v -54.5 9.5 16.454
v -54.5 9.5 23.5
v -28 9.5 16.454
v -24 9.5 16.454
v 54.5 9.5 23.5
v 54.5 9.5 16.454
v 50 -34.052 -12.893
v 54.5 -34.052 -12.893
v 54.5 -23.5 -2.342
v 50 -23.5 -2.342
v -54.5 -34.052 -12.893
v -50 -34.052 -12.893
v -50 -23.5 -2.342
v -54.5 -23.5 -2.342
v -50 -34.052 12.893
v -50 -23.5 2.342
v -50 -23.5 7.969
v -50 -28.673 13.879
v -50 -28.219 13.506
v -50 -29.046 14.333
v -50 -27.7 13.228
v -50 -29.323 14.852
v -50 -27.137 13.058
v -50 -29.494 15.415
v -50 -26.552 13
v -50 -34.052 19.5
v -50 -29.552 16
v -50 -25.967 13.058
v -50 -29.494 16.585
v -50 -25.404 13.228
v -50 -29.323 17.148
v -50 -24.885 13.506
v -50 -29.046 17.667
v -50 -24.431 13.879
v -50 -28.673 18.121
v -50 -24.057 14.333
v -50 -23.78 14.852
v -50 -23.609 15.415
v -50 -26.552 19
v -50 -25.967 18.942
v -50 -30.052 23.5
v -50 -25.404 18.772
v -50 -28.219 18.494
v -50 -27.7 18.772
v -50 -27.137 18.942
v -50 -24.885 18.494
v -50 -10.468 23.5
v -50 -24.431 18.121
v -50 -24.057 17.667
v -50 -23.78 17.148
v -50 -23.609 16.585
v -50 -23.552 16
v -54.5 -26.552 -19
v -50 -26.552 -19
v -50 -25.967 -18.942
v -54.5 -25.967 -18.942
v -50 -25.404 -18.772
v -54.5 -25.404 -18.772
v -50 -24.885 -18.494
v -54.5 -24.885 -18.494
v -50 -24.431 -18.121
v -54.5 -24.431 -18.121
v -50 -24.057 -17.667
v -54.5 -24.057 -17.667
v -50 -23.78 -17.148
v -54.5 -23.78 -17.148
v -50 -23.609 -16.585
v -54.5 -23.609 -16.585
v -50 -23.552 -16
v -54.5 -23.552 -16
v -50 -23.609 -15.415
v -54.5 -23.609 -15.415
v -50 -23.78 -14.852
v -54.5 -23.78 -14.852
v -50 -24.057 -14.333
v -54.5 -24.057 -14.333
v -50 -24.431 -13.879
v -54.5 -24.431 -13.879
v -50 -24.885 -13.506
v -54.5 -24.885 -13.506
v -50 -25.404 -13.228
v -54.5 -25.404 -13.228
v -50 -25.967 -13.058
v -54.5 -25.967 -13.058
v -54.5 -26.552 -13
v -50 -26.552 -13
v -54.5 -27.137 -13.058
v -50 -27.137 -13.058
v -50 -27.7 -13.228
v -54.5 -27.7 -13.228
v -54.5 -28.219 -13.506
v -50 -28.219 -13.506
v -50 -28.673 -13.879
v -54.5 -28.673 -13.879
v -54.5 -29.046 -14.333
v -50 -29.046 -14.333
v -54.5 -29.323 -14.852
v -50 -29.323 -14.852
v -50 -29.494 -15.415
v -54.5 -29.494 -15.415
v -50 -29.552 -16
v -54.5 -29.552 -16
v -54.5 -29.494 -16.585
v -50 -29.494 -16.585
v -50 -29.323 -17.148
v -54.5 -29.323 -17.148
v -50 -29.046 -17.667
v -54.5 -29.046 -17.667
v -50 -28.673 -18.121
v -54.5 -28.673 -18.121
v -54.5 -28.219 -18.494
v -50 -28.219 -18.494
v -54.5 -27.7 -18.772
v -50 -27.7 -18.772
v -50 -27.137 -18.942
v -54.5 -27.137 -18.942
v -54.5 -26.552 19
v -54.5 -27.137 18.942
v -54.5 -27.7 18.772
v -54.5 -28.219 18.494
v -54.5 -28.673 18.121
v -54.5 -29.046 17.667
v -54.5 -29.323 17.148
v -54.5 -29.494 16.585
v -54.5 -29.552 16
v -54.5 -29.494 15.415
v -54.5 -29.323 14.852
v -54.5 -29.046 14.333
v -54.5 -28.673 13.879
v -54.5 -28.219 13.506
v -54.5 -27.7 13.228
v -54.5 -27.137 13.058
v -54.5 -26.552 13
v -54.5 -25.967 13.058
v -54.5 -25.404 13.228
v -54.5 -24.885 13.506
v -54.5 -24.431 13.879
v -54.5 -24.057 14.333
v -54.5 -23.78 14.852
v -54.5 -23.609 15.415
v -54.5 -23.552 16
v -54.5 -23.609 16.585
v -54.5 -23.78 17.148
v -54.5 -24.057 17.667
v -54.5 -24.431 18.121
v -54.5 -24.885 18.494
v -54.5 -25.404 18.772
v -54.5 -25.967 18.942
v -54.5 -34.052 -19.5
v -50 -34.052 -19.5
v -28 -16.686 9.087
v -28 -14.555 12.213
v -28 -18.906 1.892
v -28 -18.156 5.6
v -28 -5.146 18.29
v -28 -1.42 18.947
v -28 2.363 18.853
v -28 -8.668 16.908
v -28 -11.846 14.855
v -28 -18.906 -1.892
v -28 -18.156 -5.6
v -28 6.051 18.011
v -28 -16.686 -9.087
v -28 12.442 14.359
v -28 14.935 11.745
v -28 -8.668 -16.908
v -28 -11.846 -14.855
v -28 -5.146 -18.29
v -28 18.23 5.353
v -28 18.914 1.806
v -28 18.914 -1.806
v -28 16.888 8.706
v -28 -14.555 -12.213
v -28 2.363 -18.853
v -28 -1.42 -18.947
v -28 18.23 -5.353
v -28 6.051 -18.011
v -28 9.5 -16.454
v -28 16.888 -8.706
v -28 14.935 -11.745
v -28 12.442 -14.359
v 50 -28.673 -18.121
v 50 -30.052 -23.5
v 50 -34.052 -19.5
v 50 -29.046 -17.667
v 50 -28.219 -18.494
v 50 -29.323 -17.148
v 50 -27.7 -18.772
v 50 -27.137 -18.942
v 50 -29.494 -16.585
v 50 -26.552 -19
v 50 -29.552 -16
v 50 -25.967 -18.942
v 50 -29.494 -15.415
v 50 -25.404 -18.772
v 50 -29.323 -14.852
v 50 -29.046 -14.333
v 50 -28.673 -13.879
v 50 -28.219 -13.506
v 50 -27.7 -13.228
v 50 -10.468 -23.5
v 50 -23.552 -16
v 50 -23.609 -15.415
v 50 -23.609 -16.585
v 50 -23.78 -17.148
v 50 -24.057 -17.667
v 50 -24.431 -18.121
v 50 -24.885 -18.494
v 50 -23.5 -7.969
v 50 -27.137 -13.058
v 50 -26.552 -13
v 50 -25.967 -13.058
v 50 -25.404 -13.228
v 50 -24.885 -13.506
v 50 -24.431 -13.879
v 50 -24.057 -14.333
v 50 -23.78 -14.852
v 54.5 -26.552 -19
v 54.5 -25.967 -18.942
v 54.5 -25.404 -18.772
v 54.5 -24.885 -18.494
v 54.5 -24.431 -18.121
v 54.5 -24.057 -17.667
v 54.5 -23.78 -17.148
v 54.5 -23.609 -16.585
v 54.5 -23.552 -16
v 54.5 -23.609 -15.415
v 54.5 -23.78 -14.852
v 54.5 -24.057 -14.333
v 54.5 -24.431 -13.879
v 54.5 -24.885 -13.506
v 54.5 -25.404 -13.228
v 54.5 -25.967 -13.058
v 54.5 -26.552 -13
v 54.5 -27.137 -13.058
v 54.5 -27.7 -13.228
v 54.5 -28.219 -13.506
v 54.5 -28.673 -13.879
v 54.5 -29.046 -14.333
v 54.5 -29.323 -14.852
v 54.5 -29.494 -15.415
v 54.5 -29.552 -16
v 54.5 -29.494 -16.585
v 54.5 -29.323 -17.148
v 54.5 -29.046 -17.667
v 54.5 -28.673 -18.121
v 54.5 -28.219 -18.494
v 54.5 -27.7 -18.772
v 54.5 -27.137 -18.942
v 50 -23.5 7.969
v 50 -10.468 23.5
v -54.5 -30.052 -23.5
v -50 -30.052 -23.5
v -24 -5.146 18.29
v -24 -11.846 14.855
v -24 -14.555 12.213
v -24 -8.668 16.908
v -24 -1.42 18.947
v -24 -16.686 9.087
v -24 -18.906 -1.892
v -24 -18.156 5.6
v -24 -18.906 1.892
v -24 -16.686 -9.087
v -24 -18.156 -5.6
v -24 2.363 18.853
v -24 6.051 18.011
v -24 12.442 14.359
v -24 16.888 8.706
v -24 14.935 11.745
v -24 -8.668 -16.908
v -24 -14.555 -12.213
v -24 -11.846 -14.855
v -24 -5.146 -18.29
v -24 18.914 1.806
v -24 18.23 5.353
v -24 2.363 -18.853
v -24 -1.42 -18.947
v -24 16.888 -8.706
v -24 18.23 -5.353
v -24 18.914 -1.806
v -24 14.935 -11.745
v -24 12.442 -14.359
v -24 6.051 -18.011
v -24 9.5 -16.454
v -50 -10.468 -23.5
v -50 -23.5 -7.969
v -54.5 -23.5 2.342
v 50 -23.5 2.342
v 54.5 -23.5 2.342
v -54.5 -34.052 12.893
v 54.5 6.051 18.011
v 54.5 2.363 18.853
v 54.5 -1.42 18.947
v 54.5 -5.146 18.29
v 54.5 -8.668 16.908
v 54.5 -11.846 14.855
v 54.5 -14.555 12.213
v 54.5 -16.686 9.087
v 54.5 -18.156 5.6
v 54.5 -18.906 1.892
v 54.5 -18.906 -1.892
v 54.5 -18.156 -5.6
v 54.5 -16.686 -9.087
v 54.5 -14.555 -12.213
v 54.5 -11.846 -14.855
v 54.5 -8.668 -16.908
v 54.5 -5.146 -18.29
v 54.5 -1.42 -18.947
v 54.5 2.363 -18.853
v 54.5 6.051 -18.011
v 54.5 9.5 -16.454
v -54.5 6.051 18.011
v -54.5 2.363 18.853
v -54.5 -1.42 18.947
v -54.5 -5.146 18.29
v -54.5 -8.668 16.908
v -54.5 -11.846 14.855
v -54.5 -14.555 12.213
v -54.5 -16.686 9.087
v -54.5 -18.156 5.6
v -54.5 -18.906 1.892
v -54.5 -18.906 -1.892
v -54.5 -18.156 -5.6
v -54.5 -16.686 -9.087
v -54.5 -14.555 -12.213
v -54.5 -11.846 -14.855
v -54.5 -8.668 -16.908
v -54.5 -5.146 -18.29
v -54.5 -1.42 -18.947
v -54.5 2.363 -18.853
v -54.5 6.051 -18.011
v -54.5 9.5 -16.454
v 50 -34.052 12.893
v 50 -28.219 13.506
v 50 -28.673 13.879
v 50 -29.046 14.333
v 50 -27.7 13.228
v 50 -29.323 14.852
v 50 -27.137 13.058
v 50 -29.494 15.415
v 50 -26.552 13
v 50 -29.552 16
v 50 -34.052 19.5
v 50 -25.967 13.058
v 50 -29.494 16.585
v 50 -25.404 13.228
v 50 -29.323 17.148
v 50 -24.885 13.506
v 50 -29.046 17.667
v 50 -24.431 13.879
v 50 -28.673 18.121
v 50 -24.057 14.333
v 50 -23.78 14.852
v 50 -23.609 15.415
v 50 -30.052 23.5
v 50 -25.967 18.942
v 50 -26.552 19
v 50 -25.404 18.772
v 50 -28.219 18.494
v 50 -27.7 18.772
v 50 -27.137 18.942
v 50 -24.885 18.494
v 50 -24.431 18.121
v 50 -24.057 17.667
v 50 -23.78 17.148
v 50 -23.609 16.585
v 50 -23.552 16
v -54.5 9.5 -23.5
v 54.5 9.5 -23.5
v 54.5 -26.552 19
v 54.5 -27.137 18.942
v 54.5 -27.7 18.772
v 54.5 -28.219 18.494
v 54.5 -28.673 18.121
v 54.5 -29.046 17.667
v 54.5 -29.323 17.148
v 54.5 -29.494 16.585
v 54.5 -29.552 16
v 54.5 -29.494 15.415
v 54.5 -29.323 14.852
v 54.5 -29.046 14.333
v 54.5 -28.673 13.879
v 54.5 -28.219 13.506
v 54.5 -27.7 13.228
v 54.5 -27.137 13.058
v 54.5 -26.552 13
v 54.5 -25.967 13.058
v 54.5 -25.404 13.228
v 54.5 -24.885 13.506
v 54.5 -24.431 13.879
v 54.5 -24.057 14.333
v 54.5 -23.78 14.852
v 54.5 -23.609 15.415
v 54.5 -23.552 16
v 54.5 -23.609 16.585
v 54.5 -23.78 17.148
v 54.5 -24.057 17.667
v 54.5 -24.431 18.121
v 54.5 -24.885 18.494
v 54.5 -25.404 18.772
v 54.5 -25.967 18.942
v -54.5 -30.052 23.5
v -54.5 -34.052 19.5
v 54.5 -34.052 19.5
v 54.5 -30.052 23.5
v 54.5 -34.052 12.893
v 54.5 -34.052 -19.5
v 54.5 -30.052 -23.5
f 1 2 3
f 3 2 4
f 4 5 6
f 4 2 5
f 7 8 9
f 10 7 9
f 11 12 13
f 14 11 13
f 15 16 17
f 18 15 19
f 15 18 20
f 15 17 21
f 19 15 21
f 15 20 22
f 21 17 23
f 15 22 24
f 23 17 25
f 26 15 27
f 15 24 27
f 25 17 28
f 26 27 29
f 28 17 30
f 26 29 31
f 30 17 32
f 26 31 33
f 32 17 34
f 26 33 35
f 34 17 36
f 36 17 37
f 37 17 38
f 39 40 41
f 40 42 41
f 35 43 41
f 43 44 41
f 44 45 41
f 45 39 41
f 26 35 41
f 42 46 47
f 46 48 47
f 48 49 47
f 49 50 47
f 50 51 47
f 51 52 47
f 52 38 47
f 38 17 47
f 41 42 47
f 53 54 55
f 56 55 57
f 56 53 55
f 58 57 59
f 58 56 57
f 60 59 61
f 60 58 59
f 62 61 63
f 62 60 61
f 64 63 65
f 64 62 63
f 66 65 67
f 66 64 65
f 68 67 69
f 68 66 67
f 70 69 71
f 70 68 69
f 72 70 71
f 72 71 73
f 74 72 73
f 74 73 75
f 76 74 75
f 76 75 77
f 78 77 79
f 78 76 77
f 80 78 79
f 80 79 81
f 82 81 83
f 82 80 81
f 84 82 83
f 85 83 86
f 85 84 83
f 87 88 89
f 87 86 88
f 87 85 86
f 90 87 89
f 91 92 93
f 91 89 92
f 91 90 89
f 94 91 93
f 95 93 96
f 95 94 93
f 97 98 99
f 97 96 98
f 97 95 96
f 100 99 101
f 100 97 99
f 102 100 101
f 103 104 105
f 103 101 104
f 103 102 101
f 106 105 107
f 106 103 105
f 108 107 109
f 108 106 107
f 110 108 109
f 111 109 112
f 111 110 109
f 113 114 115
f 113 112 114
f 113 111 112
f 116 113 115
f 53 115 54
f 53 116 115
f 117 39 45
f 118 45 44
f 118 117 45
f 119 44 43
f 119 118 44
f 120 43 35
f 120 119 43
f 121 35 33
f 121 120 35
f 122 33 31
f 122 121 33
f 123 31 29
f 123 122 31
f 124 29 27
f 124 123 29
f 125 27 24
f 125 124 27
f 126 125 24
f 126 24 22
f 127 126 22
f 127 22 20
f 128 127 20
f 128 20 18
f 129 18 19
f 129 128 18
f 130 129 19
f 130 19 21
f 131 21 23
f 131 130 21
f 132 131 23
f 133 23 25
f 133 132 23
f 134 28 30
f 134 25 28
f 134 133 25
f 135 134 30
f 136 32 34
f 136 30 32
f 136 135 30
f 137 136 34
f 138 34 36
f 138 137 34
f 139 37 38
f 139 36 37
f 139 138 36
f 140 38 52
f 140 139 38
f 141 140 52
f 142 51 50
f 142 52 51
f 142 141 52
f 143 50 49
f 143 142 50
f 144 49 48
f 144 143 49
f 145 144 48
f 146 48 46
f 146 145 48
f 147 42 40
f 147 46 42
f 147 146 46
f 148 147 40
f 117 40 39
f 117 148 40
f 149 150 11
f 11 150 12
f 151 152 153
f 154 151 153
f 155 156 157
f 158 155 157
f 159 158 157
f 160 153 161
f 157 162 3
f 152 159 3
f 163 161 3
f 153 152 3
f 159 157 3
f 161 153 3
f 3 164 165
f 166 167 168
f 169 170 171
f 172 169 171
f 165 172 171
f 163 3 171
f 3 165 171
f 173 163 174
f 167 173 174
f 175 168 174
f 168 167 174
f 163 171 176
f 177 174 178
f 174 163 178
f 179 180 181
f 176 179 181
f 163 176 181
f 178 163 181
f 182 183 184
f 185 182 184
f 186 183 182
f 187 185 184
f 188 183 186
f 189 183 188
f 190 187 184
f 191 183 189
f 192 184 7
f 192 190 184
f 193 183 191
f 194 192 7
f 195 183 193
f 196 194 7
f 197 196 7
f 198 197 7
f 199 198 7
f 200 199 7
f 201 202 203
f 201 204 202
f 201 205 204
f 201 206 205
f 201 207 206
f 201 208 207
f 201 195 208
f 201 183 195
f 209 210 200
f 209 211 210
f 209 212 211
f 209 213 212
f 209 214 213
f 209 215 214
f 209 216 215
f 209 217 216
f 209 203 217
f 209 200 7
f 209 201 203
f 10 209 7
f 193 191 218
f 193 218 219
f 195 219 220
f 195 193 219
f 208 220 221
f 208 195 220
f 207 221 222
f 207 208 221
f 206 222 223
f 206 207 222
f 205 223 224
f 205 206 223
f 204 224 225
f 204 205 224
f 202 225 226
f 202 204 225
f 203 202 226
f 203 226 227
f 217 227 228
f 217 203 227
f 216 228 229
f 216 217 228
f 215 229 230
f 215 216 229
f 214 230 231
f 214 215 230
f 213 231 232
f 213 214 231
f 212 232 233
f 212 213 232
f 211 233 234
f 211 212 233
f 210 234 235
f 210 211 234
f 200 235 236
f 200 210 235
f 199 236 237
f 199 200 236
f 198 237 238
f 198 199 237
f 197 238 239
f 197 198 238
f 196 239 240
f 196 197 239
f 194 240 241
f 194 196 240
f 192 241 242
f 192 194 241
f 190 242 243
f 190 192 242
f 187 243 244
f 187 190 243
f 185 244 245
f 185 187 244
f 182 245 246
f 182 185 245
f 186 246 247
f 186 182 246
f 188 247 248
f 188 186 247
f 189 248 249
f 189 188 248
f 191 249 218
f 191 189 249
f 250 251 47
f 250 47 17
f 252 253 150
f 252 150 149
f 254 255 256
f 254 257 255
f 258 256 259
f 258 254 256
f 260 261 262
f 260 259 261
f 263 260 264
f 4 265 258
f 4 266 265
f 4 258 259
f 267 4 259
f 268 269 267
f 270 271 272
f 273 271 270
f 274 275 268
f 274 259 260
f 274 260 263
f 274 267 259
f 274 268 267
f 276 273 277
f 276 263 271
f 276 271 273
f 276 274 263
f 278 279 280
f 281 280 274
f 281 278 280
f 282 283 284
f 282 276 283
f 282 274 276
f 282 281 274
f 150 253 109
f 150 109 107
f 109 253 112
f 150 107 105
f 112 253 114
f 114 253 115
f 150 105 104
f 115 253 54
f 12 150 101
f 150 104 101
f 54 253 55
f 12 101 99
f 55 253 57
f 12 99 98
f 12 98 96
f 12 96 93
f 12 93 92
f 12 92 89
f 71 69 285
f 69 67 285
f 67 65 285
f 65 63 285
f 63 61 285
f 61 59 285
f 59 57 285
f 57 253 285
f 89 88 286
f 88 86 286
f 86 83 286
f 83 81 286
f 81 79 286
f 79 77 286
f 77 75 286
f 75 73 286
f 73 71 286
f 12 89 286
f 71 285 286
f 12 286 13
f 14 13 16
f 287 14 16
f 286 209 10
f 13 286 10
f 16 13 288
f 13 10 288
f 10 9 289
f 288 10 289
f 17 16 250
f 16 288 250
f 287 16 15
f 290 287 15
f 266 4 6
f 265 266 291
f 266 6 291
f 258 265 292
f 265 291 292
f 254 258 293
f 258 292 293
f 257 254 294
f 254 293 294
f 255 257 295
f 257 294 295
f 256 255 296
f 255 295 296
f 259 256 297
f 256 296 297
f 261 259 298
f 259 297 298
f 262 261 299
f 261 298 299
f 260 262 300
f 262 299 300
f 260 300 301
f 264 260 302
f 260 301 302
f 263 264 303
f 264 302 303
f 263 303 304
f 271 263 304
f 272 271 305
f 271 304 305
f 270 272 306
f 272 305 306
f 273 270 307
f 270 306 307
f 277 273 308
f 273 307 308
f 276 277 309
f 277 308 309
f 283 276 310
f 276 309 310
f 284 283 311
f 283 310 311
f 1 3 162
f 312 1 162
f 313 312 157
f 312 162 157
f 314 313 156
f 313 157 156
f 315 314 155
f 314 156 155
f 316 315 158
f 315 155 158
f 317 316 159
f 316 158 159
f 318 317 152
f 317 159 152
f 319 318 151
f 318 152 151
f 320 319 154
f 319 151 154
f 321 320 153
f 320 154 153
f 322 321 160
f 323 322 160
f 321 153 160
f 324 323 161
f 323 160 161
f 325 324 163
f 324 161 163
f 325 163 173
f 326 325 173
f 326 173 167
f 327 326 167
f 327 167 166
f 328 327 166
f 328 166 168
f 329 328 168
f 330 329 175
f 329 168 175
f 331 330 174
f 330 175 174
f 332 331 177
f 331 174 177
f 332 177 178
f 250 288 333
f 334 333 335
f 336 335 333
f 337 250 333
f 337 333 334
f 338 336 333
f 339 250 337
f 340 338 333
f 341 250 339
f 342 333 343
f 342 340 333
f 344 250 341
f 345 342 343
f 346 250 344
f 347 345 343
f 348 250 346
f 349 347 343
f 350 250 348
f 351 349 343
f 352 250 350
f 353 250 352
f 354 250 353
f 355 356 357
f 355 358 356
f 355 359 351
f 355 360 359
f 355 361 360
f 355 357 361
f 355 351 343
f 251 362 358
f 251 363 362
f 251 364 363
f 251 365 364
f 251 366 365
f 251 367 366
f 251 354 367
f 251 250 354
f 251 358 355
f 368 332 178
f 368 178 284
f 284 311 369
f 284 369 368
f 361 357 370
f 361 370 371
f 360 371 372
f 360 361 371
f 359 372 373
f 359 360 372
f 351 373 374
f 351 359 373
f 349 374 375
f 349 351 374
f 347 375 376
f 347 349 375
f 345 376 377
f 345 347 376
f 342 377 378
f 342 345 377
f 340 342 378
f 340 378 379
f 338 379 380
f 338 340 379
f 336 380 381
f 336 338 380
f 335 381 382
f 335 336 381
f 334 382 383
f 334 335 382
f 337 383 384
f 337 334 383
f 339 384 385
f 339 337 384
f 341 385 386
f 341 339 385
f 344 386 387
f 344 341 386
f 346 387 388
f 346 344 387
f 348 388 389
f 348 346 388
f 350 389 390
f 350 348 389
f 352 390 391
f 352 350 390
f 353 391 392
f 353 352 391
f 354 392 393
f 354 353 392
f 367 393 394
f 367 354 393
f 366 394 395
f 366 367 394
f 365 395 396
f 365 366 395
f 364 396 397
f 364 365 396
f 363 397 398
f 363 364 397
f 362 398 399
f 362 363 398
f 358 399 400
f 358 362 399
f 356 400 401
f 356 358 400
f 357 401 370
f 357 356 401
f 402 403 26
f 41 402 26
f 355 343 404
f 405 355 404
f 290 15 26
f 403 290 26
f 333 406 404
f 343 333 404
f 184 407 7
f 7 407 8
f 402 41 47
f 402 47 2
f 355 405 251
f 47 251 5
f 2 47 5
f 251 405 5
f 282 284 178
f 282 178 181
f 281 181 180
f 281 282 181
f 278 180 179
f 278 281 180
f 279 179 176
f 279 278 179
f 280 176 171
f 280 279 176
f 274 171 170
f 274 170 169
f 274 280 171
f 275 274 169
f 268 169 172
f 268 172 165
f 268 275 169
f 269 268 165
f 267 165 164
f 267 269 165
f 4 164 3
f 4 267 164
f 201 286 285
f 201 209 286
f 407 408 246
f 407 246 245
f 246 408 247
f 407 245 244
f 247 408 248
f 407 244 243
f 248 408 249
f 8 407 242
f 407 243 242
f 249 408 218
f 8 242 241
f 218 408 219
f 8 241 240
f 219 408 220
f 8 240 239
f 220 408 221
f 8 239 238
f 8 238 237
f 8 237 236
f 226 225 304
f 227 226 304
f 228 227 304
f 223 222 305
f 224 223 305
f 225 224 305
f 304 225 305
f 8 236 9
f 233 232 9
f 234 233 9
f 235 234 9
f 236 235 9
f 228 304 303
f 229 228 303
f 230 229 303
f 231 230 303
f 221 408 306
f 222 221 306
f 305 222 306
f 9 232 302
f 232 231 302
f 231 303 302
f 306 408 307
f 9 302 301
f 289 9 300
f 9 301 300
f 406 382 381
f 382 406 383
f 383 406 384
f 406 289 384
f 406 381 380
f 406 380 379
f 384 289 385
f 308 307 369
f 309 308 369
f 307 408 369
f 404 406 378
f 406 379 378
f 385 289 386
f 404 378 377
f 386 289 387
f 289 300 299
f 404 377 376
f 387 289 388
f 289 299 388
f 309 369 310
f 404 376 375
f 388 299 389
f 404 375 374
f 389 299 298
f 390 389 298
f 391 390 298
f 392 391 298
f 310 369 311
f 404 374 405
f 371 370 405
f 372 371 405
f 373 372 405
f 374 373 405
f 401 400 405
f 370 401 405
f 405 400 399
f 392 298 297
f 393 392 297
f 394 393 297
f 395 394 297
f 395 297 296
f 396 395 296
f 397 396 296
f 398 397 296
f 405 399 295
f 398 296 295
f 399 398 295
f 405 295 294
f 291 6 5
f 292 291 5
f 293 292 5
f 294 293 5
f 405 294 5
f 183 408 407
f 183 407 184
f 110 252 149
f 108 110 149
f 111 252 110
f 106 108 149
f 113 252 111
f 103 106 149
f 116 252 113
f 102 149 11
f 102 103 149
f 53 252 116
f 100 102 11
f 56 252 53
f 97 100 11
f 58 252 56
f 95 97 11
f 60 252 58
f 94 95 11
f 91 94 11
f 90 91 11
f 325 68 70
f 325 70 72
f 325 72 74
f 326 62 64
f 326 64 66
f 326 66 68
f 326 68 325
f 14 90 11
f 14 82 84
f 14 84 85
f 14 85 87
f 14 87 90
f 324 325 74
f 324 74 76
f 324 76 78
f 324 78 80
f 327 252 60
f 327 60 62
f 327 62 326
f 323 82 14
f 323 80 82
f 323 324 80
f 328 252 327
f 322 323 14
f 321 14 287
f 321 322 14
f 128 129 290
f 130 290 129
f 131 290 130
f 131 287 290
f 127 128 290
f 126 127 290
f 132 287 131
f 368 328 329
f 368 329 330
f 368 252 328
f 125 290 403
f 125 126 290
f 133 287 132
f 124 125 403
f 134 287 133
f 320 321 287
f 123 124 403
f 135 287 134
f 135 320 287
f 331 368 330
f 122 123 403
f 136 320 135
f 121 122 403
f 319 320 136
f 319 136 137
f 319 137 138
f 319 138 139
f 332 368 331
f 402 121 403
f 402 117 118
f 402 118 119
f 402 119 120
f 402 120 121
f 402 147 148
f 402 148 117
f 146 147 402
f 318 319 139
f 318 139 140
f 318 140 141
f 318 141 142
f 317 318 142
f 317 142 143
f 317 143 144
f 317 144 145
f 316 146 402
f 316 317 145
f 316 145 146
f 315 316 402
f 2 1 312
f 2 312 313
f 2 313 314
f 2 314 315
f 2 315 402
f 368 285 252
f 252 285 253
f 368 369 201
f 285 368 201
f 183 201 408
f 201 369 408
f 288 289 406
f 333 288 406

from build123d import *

# Parameters (mm, degrees)
BOSS_EXTRUDE1_START = -24
SKETCH4_R           = 19
BOSS_EXTRUDE1_DEPTH = 4
SKETCH5_R           = 3
BOSS_EXTRUDE2_DEPTH = 54.5
CUT_EXTRUDE1_DEPTH  = 50
CHAMFER1_SIZE       = 4


with BuildPart() as part:
    # Sketch4 → Boss-Extrude1 (new body)
    with BuildSketch(Plane(origin=(0, 0, 0), x_dir=(0, 0, -1), z_dir=(1, 0, 0)).offset(BOSS_EXTRUDE1_START)):
        Circle(SKETCH4_R)
    extrude(amount=-BOSS_EXTRUDE1_DEPTH)

    # Sketch5 → Boss-Extrude2 (add, symmetric)
    with BuildSketch(Plane(origin=(0, 0, 0), x_dir=(0, 0, -1), z_dir=(1, 0, 0))):
        with BuildLine():
            Line((16.454482672, 9.5), (23.5, 9.5))
            Line((23.5, 9.5), (23.5, -34.051836095))
            Line((23.5, -34.051836095), (12.893398282, -34.051836095))
            Line((12.893398282, -34.051836095), (2.341562187, -23.5))
            Line((2.341562187, -23.5), (-2.341562187, -23.5))
            Line((-2.341562187, -23.5), (-12.893398282, -34.051836095))
            Line((-12.893398282, -34.051836095), (-23.5, -34.051836095))
            Line((-23.5, -34.051836095), (-23.5, 9.5))
            Line((-23.5, 9.5), (-16.454482672, 9.5))
            ThreePointArc((-16.454482672, 9.5), (0, -19), (16.454482672, 9.5))
        make_face()
        with Locations((16, -26.551836095)):
            Circle(SKETCH5_R, mode=Mode.SUBTRACT)
        with Locations(Location((-16, -26.551836095, 0), (0, 0, 180))):
            Circle(SKETCH5_R, mode=Mode.SUBTRACT)
    extrude(amount=BOSS_EXTRUDE2_DEPTH, both=True)

    # Sketch6 → Cut-Extrude1 (cut, symmetric)
    with BuildSketch(Plane(origin=(0, 0, 0), x_dir=(0, 0, -1), z_dir=(1, 0, 0))):
        Polygon((2.341562187, -23.5), (7.969107928, -23.5), (23.5, -10.468034191), (23.5, -34.051836095), (-23.5, -34.051836095), (-23.5, -10.468034191), (-7.969107928, -23.5), (-2.341562187, -23.5), align=None)
    extrude(amount=CUT_EXTRUDE1_DEPTH, both=True, mode=Mode.SUBTRACT)

    # Chamfer1
    chamfer1_edges = [part.edges().sort_by_distance(p)[0] for p in [
        (52.25, -34.051836095, 23.5),
        (52.25, -34.051836095, -23.5),
        (-52.25, -34.051836095, -23.5),
        (-52.25, -34.051836095, 23.5),
    ]]
    chamfer(chamfer1_edges, length=CHAMFER1_SIZE)


solid = part.part
